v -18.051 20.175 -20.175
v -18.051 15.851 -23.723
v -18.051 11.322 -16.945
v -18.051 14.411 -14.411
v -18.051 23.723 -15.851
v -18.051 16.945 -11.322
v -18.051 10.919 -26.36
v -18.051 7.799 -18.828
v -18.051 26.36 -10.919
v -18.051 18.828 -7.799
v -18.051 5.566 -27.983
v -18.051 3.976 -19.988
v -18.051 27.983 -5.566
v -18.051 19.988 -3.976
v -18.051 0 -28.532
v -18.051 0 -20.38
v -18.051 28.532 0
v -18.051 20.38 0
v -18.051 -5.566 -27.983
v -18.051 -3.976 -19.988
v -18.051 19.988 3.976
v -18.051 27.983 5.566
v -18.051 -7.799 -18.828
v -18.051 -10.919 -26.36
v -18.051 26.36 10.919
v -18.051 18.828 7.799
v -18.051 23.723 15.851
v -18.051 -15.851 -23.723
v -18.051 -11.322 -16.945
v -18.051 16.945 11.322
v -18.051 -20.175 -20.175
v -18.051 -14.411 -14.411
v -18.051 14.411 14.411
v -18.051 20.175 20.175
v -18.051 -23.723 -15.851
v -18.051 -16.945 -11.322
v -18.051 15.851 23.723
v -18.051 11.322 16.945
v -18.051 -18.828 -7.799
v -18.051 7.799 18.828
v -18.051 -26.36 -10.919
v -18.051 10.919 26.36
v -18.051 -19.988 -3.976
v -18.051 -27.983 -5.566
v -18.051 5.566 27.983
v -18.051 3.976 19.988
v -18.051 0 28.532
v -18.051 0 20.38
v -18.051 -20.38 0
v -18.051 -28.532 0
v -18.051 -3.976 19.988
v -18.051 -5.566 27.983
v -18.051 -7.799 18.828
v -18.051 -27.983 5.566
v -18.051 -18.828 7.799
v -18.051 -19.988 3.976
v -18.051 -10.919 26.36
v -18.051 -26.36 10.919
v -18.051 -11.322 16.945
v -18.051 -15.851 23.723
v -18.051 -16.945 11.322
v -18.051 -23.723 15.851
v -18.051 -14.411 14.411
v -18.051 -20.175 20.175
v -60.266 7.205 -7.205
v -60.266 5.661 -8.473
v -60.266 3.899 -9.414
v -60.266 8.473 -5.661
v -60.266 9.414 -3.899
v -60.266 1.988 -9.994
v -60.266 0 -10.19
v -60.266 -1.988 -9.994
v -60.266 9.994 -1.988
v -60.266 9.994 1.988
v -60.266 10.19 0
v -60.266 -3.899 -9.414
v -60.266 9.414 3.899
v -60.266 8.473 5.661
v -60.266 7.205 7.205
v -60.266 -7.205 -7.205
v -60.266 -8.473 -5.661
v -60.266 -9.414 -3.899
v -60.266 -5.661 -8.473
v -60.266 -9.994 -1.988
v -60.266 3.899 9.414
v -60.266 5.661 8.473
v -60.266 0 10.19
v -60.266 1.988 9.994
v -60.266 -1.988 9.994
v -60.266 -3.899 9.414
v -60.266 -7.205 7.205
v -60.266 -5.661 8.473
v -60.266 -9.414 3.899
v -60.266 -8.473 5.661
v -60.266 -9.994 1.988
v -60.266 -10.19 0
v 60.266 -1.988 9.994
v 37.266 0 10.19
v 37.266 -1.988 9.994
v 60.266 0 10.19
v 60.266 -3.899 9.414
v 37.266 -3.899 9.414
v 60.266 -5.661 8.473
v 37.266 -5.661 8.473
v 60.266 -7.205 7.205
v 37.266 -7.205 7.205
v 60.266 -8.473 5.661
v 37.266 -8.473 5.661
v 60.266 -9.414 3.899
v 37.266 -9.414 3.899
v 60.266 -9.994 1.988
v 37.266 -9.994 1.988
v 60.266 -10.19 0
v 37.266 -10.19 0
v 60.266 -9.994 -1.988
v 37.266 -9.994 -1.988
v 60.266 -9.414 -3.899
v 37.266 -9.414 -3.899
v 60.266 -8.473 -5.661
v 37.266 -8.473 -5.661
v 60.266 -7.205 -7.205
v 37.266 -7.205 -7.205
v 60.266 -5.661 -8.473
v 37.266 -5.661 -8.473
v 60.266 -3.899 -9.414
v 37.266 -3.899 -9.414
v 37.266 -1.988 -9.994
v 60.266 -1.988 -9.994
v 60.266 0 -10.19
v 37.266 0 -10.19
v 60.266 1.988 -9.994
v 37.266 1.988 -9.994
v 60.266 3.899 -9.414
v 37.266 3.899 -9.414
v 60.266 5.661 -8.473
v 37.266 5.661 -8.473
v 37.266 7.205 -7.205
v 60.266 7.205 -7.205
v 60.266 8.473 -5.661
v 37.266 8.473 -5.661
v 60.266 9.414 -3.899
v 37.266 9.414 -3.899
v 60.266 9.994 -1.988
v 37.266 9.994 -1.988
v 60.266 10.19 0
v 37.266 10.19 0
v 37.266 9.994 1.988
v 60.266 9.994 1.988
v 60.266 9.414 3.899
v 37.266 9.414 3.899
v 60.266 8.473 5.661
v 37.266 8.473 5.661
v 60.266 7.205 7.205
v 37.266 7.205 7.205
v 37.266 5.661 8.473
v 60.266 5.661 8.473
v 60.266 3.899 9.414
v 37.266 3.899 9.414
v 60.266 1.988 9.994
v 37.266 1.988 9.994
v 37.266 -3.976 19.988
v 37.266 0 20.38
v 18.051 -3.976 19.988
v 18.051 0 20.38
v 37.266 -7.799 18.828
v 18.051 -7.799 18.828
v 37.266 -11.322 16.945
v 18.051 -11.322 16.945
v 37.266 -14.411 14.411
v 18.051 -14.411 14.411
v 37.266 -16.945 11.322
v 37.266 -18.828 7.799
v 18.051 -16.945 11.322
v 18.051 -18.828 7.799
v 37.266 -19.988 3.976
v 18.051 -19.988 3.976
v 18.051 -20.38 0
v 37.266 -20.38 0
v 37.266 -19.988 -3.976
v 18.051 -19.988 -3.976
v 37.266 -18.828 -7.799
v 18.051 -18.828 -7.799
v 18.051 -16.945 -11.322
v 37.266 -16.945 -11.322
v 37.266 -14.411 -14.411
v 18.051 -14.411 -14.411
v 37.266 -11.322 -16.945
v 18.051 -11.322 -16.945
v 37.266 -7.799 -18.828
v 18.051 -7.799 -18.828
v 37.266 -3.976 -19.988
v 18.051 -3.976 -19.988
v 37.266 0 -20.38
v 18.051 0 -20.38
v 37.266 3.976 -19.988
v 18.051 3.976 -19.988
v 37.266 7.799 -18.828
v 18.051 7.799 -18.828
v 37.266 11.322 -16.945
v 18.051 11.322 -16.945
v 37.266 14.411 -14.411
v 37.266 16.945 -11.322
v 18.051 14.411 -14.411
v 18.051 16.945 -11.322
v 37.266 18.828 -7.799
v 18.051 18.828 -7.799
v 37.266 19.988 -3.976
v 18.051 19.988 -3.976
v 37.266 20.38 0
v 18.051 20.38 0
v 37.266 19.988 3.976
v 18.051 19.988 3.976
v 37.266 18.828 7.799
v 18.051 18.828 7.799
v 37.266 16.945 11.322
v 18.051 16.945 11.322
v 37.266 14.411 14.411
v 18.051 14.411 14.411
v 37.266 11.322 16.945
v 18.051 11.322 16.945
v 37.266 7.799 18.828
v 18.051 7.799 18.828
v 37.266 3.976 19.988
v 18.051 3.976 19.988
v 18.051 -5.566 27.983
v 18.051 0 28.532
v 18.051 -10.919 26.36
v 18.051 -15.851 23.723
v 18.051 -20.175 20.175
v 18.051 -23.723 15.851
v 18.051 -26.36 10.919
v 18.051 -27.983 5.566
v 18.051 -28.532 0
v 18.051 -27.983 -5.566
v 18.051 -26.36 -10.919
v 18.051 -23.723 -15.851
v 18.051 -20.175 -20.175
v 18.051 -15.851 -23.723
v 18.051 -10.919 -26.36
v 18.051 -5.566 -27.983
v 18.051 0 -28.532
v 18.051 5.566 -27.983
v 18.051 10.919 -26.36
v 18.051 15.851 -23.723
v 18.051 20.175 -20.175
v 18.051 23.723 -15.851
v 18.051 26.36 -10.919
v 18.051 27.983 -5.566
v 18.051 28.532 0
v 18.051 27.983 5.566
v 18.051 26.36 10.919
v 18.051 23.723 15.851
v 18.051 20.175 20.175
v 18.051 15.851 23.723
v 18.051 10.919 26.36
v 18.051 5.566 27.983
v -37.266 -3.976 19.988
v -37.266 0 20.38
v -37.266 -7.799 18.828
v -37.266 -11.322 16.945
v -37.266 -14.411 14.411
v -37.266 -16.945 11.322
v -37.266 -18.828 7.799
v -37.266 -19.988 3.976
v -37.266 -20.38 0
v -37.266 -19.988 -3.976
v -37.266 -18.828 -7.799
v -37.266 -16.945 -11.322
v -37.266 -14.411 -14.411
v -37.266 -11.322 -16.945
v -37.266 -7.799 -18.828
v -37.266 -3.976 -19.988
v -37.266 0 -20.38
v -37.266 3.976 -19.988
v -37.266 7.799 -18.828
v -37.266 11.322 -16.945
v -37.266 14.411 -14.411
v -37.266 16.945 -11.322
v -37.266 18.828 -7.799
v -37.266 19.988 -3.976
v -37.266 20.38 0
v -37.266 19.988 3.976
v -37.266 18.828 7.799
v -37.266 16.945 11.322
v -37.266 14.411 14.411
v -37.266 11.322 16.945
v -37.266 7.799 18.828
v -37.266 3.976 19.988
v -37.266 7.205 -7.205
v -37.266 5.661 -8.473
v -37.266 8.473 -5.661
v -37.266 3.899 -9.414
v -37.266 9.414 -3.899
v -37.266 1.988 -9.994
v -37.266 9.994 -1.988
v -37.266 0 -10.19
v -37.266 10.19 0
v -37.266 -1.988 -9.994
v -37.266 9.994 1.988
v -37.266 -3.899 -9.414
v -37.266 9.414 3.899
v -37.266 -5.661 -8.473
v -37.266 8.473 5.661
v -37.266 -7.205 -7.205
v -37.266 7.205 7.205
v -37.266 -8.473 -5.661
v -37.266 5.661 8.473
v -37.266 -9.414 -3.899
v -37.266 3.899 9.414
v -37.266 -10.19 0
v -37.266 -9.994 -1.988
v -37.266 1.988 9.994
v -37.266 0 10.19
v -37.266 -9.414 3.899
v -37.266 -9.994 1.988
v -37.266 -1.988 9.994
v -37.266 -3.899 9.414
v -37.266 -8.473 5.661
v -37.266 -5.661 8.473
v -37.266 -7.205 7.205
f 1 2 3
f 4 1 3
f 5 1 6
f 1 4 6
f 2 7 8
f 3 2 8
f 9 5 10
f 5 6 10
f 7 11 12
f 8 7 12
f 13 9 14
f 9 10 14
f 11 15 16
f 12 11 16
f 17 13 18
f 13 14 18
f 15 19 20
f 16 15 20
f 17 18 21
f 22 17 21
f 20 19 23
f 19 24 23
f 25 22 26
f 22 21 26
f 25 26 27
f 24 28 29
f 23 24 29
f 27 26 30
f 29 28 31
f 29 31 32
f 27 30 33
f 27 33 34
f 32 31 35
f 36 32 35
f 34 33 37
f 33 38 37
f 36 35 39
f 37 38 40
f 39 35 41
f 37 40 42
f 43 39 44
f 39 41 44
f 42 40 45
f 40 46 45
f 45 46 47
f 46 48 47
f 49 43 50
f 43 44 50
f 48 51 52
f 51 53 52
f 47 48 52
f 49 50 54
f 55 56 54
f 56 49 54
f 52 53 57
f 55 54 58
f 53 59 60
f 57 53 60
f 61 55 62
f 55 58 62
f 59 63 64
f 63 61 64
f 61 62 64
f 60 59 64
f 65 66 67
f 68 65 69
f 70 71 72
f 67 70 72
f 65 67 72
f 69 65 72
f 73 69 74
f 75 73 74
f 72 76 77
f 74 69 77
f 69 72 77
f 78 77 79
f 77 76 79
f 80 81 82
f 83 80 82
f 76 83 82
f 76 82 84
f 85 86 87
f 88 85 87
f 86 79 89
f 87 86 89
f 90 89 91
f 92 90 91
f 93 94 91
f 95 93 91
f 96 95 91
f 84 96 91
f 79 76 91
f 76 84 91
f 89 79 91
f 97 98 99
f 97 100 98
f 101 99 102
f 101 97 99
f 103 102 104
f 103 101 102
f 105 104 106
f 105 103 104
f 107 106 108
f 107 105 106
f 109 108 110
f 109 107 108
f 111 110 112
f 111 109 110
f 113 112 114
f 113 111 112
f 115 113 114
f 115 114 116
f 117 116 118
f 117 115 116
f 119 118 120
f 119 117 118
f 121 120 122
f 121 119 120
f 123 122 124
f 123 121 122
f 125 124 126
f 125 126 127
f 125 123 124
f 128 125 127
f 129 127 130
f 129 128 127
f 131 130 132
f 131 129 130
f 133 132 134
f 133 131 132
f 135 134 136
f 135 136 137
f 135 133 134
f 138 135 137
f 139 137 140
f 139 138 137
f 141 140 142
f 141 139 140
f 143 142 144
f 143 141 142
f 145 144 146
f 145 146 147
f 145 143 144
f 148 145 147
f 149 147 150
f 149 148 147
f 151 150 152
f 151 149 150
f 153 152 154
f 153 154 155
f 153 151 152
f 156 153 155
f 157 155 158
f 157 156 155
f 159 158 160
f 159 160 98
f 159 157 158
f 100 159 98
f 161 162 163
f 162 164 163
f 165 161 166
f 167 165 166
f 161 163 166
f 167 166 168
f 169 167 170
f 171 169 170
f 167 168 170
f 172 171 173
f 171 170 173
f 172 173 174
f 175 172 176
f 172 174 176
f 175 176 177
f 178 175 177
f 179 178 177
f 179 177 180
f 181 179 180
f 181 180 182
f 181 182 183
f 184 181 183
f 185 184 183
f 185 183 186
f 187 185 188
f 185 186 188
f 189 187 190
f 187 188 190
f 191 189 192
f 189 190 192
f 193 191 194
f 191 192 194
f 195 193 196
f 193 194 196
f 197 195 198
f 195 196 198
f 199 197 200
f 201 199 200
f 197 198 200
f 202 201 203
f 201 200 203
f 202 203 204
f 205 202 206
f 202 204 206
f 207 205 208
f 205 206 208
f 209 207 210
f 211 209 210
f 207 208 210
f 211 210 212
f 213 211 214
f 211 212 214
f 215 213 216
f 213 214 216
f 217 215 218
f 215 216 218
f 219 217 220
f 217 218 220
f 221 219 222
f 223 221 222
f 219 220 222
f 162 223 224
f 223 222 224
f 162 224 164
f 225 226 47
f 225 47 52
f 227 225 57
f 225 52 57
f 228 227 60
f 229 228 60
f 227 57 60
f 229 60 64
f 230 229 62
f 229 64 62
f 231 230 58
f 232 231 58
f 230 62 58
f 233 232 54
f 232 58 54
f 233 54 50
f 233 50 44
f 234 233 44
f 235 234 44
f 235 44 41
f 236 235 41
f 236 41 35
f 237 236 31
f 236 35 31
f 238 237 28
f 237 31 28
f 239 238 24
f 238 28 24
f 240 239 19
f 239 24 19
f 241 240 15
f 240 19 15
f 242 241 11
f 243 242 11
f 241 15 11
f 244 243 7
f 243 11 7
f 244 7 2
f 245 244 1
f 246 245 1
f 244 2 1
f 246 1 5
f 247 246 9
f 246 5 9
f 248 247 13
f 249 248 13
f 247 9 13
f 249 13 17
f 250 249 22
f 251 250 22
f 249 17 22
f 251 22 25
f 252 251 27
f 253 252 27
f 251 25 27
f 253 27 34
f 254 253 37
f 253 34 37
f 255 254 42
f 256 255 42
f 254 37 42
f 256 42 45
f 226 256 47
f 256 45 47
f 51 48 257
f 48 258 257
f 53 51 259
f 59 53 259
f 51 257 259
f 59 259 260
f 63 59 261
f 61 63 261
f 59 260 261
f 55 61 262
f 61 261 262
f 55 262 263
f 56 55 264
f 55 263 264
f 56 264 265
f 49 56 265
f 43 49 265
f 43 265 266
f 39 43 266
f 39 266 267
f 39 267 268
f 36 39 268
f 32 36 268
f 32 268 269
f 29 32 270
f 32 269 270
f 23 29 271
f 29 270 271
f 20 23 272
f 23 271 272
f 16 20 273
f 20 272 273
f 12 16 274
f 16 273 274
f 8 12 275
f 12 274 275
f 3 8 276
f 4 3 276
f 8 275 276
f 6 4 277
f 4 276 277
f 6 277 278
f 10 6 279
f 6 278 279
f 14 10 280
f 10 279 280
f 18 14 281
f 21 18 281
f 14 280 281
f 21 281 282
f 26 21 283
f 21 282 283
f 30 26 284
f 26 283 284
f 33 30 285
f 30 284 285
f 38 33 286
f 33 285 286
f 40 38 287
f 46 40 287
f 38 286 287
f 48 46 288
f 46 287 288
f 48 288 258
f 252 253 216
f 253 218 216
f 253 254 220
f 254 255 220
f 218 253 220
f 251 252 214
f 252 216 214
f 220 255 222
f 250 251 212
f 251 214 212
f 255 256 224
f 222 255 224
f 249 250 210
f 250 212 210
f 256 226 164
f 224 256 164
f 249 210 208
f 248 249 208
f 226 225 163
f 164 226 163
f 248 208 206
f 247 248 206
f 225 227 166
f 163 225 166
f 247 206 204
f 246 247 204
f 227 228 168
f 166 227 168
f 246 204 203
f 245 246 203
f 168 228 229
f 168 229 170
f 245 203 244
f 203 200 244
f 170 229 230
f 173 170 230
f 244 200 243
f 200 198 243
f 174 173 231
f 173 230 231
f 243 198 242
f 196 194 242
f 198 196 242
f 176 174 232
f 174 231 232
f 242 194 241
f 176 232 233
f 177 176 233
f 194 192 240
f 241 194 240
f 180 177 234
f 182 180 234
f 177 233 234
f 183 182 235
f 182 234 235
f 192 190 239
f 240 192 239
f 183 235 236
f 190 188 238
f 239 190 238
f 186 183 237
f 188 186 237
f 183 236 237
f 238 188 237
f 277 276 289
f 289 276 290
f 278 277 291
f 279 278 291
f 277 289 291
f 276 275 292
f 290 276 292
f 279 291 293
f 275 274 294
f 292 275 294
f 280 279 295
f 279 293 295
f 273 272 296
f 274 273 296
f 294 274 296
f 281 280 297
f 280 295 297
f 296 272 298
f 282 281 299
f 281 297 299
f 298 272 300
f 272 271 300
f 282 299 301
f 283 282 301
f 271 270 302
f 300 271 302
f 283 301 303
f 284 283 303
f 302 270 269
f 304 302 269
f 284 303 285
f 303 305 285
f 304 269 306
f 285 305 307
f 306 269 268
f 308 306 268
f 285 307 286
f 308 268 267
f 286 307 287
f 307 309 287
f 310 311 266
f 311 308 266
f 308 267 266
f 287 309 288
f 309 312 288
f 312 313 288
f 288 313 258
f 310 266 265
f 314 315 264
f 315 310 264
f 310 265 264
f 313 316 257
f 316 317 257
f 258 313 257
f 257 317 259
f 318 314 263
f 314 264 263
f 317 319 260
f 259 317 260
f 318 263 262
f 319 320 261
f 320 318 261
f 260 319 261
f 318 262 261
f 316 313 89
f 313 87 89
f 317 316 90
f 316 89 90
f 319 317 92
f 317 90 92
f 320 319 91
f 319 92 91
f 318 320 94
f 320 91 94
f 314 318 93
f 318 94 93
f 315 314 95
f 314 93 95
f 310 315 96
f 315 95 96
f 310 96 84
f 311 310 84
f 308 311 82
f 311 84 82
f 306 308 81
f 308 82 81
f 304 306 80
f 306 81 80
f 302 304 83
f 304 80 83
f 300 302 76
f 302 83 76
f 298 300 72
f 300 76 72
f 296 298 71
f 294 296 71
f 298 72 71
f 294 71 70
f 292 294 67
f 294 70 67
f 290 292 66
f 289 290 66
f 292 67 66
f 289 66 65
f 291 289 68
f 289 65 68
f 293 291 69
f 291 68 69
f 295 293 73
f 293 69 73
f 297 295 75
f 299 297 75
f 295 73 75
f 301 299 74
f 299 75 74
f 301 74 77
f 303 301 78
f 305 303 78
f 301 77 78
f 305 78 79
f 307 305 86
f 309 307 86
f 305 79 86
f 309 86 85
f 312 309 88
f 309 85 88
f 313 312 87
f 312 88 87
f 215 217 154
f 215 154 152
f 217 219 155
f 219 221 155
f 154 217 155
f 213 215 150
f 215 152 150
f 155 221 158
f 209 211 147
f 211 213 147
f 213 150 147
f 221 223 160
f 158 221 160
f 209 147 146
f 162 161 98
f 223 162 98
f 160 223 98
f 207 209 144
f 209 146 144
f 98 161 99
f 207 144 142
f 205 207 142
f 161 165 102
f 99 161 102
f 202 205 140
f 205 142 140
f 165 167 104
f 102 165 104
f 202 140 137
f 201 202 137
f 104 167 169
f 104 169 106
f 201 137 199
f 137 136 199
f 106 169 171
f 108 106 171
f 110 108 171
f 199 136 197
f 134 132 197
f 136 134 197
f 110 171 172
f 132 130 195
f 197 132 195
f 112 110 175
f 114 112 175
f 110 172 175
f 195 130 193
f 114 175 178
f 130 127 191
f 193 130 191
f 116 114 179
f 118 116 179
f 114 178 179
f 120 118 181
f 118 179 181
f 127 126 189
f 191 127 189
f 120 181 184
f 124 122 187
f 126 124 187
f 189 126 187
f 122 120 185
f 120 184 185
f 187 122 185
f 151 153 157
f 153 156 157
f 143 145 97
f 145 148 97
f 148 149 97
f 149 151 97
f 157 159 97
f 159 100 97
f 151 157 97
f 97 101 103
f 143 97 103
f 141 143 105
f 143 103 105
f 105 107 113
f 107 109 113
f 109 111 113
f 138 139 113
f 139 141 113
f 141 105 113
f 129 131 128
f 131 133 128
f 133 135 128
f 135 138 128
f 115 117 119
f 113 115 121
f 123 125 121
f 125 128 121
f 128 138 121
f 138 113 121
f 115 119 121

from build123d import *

# Parameters (mm, degrees)
F0_W = 22.9998864233
F0_H = 10.1898247376


with BuildPart() as f1:
    # F0 (on Front) → F1 (revolve)
    with BuildSketch(Plane.XZ):
        Polygon((-40.3225906193, 0), (-37.2656472027, 0), (-37.2656472027, 10.1898247376), (-60.2655336261, 10.1898247376), (-60.2655336261, 0), align=None)
        Polygon((-37.2656472027, 0), (-18.0505476892, 0), (-18.0505476892, 20.3796494752), (-37.2656472027, 20.3796494752), (-37.2656472027, 10.1898247376), align=None)
        Polygon((-18.0505476892, 0), (0, 0), (0, 28.5315085202), (-18.0505476892, 28.5315085202), (-18.0505476892, 20.3796494752), align=None)
        Polygon((0, 28.5315085202), (0, 0), (18.0505476892, 0), (18.0505476892, 20.3796494752), (18.0505476892, 28.5315085202), align=None)
        Polygon((18.0505476892, 20.3796494752), (18.0505476892, 0), (37.2656472027, 0), (37.2656472027, 10.1898247376), (37.2656472027, 20.3796494752), align=None)
        with Locations((48.7655904144, 5.0949123688)):
            Rectangle(F0_W, F0_H)
    revolve(axis=Axis((3.493655473, 0, 0), (1, 0, 0)))


solid = f1.part
